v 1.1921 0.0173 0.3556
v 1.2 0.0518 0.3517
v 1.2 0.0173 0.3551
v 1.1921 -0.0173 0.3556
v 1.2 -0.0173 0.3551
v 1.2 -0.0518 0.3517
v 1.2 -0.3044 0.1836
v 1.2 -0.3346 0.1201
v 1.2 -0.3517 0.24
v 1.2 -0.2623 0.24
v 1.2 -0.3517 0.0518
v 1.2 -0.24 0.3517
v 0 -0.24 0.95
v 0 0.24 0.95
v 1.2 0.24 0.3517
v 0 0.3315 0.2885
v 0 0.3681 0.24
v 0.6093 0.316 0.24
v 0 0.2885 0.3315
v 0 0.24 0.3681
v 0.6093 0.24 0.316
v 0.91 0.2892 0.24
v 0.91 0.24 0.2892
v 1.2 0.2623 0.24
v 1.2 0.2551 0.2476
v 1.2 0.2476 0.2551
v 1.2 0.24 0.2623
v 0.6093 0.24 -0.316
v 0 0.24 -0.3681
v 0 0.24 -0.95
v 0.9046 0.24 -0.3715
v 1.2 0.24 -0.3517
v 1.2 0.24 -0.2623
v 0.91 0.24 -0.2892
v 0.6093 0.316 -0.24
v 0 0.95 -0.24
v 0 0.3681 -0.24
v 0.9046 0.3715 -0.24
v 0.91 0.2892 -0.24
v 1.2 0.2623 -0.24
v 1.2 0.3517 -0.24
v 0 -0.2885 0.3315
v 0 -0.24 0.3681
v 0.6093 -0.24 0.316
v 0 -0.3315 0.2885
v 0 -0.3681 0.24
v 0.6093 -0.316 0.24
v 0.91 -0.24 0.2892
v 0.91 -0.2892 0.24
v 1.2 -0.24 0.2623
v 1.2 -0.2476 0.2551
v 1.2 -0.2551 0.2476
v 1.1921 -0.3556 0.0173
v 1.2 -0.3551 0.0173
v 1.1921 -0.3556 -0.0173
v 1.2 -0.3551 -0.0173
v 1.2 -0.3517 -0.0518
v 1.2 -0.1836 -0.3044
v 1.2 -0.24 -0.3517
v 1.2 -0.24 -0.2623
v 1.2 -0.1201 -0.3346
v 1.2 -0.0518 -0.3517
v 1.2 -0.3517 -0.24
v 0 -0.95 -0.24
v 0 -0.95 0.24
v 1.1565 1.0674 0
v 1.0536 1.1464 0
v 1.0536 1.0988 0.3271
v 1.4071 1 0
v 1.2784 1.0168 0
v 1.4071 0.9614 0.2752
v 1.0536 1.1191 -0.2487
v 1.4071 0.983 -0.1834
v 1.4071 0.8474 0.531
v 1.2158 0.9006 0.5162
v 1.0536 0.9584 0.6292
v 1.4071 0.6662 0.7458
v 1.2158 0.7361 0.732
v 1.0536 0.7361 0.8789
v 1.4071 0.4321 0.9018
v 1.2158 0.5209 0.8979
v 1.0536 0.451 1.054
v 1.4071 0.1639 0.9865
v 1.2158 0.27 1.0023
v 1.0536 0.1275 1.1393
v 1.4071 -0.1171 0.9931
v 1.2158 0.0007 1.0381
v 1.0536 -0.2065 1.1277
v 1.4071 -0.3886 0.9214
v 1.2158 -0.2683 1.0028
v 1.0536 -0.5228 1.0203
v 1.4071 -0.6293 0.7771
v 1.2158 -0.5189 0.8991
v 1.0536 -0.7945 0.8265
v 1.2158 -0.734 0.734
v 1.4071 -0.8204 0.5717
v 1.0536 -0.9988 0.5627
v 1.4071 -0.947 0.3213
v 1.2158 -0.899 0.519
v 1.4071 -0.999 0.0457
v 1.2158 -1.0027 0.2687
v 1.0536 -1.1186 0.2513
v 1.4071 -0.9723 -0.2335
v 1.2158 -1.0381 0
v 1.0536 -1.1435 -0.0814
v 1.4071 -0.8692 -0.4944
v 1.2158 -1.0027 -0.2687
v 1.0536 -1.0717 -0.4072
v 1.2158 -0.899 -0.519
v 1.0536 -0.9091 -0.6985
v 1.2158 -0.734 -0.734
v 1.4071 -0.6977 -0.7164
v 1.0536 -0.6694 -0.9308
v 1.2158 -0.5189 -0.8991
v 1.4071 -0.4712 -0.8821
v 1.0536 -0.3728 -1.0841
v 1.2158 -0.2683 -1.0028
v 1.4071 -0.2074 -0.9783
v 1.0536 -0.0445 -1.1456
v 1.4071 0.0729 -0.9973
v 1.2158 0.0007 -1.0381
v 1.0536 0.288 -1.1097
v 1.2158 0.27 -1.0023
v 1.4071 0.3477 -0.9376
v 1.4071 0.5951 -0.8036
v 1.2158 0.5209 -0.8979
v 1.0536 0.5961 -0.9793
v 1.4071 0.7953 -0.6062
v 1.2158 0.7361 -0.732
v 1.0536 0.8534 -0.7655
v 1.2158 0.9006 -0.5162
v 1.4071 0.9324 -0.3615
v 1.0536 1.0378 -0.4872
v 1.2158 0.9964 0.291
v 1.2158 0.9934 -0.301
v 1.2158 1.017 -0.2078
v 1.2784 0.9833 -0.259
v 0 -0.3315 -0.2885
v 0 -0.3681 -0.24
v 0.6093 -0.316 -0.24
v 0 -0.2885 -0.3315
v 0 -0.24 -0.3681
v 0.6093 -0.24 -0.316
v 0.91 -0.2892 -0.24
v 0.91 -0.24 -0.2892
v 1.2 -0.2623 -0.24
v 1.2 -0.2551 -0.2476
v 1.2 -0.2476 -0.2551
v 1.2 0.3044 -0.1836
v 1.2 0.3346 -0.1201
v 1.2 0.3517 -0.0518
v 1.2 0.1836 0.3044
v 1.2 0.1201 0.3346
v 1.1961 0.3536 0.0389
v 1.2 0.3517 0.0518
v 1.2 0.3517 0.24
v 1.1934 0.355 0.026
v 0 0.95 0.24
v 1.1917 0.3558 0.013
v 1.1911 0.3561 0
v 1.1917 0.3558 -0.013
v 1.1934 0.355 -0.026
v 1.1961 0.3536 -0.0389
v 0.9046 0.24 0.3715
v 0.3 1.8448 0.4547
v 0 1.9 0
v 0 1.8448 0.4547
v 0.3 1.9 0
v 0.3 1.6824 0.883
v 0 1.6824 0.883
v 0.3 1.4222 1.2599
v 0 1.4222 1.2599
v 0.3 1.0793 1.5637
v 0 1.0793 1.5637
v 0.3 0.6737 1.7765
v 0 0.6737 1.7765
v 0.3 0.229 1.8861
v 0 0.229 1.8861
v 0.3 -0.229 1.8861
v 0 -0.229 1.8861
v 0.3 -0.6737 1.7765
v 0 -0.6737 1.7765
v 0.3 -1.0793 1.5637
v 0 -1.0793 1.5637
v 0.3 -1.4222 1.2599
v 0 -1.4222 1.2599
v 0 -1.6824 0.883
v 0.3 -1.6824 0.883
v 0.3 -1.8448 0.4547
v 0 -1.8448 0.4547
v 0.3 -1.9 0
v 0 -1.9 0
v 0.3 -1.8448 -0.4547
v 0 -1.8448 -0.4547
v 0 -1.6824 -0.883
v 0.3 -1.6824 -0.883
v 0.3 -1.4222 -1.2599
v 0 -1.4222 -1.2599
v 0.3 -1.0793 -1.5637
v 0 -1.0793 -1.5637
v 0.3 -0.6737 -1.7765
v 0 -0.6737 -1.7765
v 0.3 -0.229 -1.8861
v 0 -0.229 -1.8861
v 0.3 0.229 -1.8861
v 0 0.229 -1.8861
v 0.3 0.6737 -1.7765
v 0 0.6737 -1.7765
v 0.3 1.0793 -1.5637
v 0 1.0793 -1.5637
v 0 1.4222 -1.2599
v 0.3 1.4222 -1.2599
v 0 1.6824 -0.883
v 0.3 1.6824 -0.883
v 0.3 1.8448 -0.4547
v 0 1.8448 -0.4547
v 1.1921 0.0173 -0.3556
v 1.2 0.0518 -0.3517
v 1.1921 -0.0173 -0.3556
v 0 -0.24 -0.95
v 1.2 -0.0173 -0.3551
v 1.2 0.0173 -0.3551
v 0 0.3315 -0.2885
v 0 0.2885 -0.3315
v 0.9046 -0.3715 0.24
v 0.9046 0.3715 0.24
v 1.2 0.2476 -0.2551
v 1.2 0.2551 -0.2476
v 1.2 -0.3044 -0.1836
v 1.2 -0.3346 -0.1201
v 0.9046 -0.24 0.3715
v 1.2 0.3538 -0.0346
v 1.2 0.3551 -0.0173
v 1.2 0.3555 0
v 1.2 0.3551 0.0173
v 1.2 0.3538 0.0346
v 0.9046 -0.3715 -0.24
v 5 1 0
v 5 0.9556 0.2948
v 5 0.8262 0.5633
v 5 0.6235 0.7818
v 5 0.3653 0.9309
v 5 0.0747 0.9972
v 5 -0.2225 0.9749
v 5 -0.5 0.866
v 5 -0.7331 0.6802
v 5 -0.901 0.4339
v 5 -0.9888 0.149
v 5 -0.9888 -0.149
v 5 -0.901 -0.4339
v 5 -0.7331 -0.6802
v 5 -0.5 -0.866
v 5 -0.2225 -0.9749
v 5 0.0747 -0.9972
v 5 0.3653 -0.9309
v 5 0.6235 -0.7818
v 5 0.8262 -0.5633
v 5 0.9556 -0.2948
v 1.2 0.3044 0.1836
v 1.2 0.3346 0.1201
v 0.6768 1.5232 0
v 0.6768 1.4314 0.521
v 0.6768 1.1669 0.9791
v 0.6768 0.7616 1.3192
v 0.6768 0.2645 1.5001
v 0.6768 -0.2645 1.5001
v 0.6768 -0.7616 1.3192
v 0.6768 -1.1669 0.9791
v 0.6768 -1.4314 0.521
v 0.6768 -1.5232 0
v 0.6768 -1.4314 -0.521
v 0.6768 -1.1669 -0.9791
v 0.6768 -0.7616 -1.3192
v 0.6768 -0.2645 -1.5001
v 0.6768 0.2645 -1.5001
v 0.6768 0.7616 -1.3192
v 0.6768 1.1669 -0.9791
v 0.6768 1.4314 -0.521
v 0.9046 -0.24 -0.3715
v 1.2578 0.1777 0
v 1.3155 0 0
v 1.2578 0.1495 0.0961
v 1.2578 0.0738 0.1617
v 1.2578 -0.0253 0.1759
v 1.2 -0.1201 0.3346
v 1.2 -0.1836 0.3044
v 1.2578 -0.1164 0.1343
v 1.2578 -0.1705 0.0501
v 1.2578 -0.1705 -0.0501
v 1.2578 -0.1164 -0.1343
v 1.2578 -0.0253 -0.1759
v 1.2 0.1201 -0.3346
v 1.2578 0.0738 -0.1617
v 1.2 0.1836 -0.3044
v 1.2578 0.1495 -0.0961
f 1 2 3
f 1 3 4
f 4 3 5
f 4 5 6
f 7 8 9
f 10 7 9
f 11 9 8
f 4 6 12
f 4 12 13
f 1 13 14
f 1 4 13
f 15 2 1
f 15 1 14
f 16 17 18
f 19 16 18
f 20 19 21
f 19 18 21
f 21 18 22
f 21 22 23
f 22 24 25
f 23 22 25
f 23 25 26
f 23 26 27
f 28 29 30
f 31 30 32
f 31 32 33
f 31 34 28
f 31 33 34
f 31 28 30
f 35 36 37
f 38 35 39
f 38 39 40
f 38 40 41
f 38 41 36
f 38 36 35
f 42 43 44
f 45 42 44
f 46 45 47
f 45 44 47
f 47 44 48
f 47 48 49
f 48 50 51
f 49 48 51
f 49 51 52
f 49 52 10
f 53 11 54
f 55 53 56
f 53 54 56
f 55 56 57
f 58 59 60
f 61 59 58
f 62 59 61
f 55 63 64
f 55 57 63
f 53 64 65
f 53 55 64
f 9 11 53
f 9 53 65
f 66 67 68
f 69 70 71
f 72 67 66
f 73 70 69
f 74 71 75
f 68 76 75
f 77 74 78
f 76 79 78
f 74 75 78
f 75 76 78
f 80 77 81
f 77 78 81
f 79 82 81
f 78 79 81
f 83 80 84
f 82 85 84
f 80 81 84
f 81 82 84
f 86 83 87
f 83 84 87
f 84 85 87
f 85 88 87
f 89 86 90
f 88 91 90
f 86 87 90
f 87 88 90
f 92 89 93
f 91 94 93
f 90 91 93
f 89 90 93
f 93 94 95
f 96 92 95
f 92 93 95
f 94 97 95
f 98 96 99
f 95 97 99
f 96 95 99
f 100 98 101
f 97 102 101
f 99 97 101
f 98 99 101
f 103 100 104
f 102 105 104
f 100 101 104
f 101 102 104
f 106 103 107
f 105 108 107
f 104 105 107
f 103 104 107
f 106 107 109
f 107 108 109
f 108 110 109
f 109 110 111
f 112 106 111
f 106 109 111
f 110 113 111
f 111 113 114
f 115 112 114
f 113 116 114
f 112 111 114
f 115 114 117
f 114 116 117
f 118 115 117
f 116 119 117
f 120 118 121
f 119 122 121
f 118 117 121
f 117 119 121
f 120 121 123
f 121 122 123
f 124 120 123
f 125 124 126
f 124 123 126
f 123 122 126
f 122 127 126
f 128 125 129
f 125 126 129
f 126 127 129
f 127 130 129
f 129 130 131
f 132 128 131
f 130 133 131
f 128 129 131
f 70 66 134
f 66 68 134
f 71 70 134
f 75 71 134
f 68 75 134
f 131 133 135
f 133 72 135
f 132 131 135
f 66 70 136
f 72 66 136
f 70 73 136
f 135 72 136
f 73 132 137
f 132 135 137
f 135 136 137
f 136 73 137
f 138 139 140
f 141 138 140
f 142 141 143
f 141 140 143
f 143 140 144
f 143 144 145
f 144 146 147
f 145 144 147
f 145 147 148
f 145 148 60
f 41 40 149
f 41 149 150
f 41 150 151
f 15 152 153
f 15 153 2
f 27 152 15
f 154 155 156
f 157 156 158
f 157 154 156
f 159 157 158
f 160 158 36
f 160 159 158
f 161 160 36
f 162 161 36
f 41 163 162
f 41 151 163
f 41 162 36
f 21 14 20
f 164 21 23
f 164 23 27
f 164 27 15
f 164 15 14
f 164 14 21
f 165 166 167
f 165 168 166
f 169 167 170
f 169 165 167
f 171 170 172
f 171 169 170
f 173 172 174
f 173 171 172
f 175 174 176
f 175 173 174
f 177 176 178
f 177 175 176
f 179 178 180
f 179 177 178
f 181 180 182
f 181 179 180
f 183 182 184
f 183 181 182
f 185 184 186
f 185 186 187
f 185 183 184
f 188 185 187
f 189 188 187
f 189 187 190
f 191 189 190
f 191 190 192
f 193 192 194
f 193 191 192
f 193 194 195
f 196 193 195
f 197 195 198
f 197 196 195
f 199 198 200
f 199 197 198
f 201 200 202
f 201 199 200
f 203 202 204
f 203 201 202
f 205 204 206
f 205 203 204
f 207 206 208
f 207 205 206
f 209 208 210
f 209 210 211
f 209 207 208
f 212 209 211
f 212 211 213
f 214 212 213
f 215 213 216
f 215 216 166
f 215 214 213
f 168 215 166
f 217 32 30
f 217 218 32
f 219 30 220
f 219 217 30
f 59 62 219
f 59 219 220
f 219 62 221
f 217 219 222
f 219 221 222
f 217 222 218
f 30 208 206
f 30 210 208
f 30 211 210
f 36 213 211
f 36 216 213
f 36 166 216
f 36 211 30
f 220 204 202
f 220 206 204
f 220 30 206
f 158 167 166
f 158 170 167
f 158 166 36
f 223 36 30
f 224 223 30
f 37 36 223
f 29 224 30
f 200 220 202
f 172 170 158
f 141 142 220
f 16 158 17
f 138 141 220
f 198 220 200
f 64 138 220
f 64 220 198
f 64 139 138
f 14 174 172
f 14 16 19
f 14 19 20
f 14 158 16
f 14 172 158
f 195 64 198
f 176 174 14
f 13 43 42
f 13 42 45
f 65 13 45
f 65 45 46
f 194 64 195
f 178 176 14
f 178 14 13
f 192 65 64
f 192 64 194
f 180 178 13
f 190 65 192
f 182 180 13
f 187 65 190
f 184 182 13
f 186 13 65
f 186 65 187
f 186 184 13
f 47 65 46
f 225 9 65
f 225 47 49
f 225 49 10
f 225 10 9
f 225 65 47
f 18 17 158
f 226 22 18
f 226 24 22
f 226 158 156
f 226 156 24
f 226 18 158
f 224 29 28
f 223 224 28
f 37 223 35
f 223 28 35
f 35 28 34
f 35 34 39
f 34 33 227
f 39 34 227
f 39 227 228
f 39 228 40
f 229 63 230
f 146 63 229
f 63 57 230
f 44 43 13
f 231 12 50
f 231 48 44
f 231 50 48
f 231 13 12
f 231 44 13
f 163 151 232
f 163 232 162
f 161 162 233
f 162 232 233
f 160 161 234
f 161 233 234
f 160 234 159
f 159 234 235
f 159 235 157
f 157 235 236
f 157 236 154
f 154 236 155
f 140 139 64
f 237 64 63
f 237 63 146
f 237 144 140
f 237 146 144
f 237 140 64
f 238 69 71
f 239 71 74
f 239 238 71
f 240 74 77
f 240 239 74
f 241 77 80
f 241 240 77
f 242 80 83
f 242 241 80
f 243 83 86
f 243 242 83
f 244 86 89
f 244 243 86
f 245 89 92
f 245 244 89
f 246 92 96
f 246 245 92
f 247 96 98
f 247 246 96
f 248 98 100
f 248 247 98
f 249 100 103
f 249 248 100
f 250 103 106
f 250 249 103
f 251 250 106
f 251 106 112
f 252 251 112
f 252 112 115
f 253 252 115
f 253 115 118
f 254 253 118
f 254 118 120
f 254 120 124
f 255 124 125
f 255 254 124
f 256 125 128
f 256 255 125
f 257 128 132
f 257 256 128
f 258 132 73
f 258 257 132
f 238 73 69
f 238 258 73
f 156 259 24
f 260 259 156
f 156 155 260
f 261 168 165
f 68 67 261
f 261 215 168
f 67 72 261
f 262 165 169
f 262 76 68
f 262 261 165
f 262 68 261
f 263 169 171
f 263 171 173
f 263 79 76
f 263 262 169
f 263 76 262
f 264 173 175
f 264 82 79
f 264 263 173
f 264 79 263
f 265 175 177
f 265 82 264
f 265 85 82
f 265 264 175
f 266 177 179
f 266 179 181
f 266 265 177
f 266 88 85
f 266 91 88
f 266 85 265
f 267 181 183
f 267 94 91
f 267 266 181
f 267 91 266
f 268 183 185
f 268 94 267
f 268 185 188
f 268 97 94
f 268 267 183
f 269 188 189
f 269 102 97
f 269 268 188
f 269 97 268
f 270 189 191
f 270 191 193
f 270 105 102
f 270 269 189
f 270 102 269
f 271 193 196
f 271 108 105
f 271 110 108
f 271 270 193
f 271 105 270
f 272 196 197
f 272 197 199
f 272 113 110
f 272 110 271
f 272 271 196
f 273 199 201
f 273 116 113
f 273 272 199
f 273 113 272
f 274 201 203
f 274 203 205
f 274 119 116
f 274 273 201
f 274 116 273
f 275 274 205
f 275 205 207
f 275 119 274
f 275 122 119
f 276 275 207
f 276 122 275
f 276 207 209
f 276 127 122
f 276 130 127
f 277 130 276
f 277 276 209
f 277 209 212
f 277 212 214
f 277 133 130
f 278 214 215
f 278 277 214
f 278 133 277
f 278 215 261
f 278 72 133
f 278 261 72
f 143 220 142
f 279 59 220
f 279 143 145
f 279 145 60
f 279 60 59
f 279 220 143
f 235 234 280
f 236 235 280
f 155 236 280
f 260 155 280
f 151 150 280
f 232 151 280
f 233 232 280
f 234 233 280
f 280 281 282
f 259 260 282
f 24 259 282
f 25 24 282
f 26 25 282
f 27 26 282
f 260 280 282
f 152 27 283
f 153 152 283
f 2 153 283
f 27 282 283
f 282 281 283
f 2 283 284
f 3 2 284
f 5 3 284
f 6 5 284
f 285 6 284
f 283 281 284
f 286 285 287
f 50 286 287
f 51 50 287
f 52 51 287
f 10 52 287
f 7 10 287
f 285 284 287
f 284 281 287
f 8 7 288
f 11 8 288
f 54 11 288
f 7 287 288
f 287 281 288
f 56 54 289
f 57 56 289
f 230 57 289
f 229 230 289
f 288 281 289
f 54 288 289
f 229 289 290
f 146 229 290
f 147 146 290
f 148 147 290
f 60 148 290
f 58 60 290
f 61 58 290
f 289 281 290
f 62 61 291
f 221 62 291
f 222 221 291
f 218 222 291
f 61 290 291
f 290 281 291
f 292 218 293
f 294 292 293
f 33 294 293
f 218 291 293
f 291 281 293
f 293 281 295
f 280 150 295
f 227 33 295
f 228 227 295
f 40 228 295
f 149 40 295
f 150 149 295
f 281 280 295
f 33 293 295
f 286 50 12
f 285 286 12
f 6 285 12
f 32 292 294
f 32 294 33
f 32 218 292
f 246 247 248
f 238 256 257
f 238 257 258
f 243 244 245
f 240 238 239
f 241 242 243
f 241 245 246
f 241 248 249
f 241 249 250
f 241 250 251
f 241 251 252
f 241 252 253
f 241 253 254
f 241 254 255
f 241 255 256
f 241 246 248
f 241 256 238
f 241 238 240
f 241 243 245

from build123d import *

# Parameters (mm, degrees)
FILLET1_R    = 0.5
SKETCH3_W    = 0.48
SKETCH3_H    = 1.9
SKETCH4_W    = 0.48
SKETCH4_H    = 0.703404182
RECPAT_COUNT = 2
RECPAT_ANGLE = 90


with BuildPart() as part:
    # BodySke → Base-Revolve (revolve)
    with BuildSketch(Plane.XY):
        Polygon((0, 0), (0, 1.9), (0.3, 1.9), (1.2, 1), (5, 1), (5, 0), align=None)
    revolve(axis=Axis((-6.35, 0, 0), (1, 0, 0)))

    # Fillet1
    fillet1_edges = [part.edges().sort_by_distance(p)[0] for p in [
        (1.2, -1, 0),
    ]]
    fillet(fillet1_edges, radius=FILLET1_R)

    # Sketch3 → Recess section 0
    with BuildSketch(Plane.ZY):
        Rectangle(SKETCH3_W, SKETCH3_H)
    # Sketch4 → Recess section 1
    with BuildSketch(Plane.ZY.offset(-1.2)):
        Rectangle(SKETCH4_W, SKETCH4_H)
    recess = loft(mode=Mode.SUBTRACT)

    # RecPat: Recess ×2 about axis
    recpat_axis = Axis((0, 0, 0), (1, 0, 0))
    for i in range(1, RECPAT_COUNT):
        add(recess.rotate(recpat_axis, i * RECPAT_ANGLE / (RECPAT_COUNT - 1)), mode=Mode.SUBTRACT)

    # RecCorSke → RecessCore (revolve, cut)
    with BuildSketch(Plane.XY):
        Polygon((0, 0), (0, 0.439412174), (1.2, 0.3555), (1.315508952, 0), align=None)
    revolve(axis=Axis((-3.175, 0, 0), (1, 0, 0)), mode=Mode.SUBTRACT)


solid = part.part
